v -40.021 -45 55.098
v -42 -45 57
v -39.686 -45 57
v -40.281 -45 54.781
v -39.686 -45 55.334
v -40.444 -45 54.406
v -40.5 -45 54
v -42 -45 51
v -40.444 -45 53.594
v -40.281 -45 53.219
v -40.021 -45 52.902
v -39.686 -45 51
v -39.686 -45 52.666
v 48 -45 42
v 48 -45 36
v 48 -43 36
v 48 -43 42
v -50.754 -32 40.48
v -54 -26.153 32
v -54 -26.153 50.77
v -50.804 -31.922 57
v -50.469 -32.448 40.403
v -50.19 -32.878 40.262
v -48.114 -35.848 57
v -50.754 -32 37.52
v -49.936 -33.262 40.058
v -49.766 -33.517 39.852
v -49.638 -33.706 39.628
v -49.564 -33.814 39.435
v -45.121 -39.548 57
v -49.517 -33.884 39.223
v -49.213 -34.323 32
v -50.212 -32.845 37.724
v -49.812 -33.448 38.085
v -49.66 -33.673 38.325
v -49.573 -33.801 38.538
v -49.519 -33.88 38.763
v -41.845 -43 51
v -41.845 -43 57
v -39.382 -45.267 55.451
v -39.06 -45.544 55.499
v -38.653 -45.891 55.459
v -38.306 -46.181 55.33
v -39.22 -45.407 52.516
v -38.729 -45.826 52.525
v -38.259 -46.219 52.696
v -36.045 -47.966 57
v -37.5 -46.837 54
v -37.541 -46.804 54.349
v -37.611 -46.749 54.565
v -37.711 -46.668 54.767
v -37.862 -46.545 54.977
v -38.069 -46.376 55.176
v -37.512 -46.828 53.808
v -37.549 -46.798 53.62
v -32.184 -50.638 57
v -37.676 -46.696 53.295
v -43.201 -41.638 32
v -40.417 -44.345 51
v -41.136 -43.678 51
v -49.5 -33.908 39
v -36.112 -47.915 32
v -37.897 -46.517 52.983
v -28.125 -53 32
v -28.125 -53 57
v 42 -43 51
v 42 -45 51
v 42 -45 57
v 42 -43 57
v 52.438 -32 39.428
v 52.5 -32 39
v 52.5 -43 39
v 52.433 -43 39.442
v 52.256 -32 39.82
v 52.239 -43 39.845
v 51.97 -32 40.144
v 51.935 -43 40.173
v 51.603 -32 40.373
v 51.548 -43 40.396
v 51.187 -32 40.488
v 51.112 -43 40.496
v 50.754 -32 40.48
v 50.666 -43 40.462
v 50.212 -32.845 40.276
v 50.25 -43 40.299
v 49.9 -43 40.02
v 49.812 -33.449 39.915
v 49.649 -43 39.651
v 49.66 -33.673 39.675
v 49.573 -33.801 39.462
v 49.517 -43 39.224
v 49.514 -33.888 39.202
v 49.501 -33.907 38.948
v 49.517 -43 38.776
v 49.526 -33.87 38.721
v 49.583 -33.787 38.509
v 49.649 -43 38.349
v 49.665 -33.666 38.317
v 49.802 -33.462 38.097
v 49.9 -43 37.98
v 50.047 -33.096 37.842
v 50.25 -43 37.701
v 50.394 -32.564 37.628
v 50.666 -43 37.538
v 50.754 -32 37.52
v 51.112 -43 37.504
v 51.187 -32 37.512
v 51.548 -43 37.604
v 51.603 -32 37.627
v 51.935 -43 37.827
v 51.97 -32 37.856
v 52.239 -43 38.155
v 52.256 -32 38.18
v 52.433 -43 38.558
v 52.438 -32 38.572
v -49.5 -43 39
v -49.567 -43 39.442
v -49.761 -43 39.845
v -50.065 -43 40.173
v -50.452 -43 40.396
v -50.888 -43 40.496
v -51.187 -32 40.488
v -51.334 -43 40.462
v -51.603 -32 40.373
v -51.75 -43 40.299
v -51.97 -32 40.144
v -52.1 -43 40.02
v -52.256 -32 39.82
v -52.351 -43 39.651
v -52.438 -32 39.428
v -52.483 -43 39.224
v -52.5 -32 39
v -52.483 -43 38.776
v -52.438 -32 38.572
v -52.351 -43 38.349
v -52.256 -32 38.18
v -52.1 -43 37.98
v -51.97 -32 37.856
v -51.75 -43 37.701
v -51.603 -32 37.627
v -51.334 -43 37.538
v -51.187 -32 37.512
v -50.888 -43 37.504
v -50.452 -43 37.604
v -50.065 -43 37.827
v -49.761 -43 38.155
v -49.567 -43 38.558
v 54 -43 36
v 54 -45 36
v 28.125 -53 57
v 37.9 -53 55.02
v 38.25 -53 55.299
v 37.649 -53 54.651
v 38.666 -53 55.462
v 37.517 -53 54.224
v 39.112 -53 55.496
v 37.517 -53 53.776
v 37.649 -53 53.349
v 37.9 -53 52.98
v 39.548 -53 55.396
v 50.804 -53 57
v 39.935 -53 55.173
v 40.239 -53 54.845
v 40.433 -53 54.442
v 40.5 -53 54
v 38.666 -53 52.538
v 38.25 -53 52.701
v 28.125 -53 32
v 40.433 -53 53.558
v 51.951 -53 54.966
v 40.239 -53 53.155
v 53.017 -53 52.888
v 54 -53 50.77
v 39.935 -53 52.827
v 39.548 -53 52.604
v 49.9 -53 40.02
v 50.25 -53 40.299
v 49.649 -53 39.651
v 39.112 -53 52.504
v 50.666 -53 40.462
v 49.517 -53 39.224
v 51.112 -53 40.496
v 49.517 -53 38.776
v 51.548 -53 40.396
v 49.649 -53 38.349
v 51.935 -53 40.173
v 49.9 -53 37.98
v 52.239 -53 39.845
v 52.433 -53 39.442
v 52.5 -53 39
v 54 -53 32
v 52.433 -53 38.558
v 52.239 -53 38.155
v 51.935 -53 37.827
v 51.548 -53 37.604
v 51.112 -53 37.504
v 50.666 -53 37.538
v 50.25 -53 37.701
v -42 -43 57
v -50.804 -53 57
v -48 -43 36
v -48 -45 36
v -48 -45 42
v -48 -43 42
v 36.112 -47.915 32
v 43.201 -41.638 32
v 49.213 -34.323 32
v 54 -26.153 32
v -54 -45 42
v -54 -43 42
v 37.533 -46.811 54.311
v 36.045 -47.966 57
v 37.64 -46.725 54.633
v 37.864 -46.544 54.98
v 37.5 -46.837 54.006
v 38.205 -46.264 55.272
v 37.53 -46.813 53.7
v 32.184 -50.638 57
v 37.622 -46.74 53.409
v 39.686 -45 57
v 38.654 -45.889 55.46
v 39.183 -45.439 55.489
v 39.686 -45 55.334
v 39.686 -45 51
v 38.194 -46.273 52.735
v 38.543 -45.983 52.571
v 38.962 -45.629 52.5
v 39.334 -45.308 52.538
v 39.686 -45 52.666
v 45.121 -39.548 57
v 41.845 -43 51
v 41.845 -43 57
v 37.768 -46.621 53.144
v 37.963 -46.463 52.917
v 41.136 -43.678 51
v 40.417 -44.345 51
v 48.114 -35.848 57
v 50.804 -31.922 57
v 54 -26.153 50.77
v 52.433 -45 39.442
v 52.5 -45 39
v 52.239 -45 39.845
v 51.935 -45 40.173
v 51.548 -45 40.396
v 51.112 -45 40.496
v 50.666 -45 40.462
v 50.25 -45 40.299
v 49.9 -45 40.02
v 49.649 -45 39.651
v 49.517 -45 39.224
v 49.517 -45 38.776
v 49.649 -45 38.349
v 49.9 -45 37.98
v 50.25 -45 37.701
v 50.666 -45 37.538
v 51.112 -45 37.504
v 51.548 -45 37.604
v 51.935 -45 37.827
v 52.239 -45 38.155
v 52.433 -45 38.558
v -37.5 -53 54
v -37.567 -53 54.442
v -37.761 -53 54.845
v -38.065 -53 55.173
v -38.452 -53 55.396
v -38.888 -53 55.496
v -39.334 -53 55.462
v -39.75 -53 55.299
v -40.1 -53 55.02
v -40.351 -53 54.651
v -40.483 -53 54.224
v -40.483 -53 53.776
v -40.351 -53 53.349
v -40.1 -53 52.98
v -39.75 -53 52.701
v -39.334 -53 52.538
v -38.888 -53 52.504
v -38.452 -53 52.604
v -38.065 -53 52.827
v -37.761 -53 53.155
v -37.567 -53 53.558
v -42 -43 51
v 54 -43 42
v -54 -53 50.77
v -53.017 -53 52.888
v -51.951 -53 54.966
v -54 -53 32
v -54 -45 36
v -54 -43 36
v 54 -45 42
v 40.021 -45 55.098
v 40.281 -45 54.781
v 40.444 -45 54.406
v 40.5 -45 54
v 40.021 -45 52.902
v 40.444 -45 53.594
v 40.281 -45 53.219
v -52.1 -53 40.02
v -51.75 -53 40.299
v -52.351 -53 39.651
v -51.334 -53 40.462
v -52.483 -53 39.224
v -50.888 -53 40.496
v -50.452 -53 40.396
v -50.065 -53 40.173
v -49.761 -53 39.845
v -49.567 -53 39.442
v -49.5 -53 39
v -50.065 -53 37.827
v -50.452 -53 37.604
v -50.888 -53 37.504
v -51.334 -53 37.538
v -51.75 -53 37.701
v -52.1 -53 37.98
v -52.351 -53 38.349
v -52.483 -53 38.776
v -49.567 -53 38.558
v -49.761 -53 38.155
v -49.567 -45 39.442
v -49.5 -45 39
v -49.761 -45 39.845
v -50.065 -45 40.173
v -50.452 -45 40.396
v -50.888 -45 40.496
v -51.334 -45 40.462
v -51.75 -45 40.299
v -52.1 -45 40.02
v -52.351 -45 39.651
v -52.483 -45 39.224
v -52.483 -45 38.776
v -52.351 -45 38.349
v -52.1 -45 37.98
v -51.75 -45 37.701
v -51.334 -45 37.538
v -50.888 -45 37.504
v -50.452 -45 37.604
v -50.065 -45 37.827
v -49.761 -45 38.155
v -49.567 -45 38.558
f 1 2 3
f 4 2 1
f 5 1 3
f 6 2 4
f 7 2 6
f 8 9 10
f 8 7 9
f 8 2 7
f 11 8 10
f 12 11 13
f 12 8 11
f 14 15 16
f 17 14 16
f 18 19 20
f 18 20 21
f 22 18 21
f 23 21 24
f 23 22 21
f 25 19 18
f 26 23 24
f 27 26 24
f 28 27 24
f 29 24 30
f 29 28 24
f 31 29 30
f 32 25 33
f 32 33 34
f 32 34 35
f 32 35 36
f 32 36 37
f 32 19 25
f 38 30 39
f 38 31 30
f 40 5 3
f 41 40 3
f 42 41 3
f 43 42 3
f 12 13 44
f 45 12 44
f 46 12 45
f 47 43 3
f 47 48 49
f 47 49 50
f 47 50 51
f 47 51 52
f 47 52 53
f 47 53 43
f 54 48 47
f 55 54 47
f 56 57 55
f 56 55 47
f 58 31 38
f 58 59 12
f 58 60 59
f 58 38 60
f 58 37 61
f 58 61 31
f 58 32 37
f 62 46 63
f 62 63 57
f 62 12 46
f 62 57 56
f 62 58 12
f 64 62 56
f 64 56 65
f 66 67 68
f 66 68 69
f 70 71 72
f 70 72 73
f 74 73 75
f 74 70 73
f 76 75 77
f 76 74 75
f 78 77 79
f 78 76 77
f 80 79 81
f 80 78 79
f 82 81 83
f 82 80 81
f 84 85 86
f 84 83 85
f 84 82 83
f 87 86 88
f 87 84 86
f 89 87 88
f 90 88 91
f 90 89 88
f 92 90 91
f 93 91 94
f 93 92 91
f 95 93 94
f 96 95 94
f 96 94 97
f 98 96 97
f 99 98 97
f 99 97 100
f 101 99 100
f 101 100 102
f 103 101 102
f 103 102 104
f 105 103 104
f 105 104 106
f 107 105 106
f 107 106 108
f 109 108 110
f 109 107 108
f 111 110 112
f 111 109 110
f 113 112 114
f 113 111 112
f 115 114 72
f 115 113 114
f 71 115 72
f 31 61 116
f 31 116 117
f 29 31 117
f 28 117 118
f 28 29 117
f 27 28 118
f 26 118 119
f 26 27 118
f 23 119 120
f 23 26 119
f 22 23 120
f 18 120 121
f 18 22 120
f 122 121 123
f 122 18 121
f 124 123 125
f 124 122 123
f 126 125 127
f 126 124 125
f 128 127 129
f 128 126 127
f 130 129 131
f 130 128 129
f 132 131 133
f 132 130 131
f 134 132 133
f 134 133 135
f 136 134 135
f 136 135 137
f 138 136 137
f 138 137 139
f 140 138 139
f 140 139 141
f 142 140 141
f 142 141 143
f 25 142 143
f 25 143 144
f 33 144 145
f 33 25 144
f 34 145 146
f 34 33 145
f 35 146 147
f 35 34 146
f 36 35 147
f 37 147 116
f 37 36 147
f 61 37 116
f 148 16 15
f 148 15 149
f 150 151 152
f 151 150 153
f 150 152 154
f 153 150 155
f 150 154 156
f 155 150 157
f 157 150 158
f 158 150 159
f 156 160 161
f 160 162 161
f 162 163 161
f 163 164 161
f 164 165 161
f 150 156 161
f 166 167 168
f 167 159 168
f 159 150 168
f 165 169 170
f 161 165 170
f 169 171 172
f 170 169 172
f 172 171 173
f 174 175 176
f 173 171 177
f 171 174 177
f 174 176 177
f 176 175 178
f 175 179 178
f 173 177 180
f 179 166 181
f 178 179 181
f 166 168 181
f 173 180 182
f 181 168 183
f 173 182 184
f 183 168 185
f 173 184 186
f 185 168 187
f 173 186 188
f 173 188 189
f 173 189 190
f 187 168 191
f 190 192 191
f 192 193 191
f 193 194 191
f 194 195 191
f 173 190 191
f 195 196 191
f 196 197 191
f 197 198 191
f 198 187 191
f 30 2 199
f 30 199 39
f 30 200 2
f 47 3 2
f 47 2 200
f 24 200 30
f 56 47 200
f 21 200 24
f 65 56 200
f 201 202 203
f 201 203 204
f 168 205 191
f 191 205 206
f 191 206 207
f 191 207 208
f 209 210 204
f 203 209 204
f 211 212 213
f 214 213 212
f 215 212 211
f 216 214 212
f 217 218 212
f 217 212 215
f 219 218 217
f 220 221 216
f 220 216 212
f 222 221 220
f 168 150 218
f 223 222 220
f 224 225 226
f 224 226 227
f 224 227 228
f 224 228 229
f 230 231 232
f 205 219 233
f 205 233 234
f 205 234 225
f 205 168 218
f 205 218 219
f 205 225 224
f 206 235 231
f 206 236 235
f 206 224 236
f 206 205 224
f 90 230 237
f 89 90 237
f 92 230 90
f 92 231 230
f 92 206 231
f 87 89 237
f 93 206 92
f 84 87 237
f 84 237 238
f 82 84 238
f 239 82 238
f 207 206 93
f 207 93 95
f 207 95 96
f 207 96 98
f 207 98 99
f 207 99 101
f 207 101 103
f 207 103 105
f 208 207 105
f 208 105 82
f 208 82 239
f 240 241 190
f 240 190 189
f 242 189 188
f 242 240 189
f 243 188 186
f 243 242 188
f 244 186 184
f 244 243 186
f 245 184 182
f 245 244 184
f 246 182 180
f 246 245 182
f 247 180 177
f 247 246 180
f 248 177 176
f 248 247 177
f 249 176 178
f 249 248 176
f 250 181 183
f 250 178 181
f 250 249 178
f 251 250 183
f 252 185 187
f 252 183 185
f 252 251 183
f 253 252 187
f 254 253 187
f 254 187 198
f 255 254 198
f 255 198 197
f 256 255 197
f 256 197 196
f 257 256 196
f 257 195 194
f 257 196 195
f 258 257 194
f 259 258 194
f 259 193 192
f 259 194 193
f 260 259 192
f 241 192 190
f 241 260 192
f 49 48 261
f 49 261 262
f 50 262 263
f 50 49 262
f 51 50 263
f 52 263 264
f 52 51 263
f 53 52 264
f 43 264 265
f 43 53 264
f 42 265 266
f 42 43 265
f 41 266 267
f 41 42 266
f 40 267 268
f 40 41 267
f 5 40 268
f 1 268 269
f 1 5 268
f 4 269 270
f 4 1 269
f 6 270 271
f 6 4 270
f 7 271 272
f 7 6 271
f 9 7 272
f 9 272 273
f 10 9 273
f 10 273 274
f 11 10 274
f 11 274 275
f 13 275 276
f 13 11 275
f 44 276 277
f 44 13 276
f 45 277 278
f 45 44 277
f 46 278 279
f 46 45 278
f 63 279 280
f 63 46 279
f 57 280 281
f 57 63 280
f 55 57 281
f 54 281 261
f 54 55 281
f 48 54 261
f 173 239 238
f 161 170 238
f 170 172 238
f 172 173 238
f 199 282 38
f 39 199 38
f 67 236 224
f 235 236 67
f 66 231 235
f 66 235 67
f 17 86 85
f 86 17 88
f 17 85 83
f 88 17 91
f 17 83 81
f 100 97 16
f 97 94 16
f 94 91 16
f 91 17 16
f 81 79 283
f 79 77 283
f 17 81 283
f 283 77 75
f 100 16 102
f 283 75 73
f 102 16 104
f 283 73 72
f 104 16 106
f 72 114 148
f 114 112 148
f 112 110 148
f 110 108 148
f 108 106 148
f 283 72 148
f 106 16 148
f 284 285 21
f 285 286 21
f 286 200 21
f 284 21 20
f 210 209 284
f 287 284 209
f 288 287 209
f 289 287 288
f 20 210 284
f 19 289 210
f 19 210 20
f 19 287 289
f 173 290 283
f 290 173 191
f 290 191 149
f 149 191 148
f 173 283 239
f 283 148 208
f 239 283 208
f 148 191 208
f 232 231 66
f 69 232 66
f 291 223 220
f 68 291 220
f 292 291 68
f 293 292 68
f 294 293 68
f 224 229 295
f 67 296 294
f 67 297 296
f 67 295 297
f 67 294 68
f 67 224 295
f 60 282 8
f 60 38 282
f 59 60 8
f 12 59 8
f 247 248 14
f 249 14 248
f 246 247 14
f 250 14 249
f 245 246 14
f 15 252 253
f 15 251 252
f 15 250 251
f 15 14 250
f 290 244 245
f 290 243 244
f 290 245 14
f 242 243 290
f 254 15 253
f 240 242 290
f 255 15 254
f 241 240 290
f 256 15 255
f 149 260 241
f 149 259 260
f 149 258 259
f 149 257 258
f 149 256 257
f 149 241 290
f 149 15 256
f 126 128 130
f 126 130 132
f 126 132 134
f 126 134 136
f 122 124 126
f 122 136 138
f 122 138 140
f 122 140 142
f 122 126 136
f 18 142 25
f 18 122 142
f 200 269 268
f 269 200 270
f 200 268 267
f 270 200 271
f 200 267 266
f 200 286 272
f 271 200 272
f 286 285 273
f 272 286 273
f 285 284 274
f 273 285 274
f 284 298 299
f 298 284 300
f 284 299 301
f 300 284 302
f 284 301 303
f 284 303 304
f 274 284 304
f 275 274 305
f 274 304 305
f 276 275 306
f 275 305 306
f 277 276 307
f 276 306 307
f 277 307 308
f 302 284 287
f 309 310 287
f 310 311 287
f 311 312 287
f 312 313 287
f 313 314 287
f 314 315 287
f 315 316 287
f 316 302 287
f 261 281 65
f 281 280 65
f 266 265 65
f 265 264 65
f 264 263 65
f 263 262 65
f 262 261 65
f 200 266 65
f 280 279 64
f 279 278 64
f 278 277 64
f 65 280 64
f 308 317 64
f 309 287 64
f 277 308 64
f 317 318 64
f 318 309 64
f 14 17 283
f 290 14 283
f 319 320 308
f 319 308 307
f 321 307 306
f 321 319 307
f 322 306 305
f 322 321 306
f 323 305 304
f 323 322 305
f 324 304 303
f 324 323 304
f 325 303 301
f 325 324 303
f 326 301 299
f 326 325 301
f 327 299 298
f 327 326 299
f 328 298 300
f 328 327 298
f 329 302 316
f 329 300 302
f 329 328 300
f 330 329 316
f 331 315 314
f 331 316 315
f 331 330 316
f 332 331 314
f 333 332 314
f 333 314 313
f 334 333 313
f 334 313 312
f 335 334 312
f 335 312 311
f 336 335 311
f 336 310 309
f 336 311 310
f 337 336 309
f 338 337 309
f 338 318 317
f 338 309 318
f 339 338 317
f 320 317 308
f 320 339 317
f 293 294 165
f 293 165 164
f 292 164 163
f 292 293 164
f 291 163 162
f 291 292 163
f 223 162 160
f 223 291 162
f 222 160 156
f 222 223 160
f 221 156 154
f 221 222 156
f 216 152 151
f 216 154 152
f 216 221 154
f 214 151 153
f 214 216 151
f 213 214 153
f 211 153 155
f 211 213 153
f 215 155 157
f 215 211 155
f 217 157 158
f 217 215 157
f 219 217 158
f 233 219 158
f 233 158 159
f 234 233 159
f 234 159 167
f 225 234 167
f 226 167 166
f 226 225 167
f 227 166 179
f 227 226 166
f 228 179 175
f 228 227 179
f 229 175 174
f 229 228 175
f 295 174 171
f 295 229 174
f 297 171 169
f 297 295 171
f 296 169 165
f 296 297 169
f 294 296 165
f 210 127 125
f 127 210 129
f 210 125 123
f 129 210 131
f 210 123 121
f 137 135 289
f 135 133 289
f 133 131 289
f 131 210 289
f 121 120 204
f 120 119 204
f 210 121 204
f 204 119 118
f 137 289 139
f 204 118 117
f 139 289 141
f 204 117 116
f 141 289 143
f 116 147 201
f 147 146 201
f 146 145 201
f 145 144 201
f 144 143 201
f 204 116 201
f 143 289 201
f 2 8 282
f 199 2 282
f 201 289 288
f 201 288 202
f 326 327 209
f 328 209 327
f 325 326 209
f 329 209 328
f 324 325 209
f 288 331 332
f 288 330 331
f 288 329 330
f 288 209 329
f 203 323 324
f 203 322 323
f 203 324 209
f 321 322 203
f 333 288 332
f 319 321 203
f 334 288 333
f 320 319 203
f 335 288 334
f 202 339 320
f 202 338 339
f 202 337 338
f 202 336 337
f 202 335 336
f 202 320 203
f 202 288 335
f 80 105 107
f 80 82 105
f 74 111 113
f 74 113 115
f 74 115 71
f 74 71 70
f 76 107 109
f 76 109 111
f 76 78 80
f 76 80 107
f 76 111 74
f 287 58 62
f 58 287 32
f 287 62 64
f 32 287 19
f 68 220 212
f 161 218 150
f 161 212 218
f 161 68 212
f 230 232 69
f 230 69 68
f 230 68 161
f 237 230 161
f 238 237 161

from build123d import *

# Parameters (mm, degrees)
CYLINDER1442_R     = 1.5
CYLINDER1442_DEPTH = 40
CYLINDER1441_R     = 1.5
CYLINDER1441_DEPTH = 40
BOX485_W           = 6
BOX485_H           = 2
BOX485_DEPTH       = 6
BOX486_W           = 6
BOX486_H           = 2
BOX486_DEPTH       = 6
CYLINDER1440_R     = 59
CYLINDER1440_DEPTH = 40
BOX475_W           = 6
BOX475_H           = 2
BOX475_DEPTH       = 6
BOX474_W           = 6
BOX474_H           = 2
BOX474_DEPTH       = 6
CYLINDER1428_R     = 1.5
CYLINDER1428_DEPTH = 40
CYLINDER1427_R     = 1.5
CYLINDER1427_DEPTH = 40
CYLINDER1439_R     = 60
CYLINDER1439_DEPTH = 25
BOX484_W           = 108
BOX484_H           = 46
BOX484_DEPTH       = 25


with BuildPart() as v_lec1442:
    # Cylinder1442 → Cylinder1442 (new body)
    with BuildSketch(Plane(origin=(-39, -40, 59), x_dir=(1, 0, 0), z_dir=(0, -1, 0))):
        Circle(CYLINDER1442_R)
    extrude(amount=CYLINDER1442_DEPTH)


with BuildPart() as compound847:
    # Cylinder1441 → Cylinder1441 (new body)
    with BuildSketch(Plane(origin=(39, -40, 59), x_dir=(1, 0, 0), z_dir=(0, -1, 0))):
        Circle(CYLINDER1441_R)
    extrude(amount=CYLINDER1441_DEPTH)

    # Compound847: union Válec1442
    add(v_lec1442.part)


with BuildPart() as compound847_1:
    # Compound847 placement: moved
    add(compound847.part.moved(Location((0, 0, -5))))


with BuildPart() as krychle485:
    # Box485 → Box485 (new body)
    with BuildSketch(Plane(origin=(36, -47, 56), x_dir=(1, 0, 0), z_dir=(0, 0, 1))):
        with Locations((3, 1)):
            Rectangle(BOX485_W, BOX485_H)
    extrude(amount=BOX485_DEPTH)


with BuildPart() as compound850:
    # Box486 → Box486 (new body)
    with BuildSketch(Plane(origin=(-42, -47, 56), x_dir=(1, 0, 0), z_dir=(0, 0, 1))):
        with Locations((3, 1)):
            Rectangle(BOX486_W, BOX486_H)
    extrude(amount=BOX486_DEPTH)

    # Compound850: union Krychle485
    add(krychle485.part)


with BuildPart() as compound850_1:
    # Compound850 placement: moved
    add(compound850.part.moved(Location((0, 2, -5))))


with BuildPart() as v_lec1440:
    # Cylinder1440 → Cylinder1440 (new body)
    with BuildSketch(Plane(origin=(0, -17, 27), x_dir=(1, 0, 0), z_dir=(0, -1, 0))):
        Circle(CYLINDER1440_R)
    extrude(amount=CYLINDER1440_DEPTH)


with BuildPart() as krychle475:
    # Box475 → Box475 (new body)
    with BuildSketch(Plane(origin=(-54, -45, 35), x_dir=(1, 0, 0), z_dir=(0, 0, 1))):
        with Locations((3, 1)):
            Rectangle(BOX475_W, BOX475_H)
    extrude(amount=BOX475_DEPTH)


with BuildPart() as compound853:
    # Box474 → Box474 (new body)
    with BuildSketch(Plane(origin=(48, -45, 35), x_dir=(1, 0, 0), z_dir=(0, 0, 1))):
        with Locations((3, 1)):
            Rectangle(BOX474_W, BOX474_H)
    extrude(amount=BOX474_DEPTH)

    # Compound853: union Krychle475
    add(krychle475.part)


with BuildPart() as compound853_1:
    # Compound853 placement: moved
    add(compound853.part.moved(Location((0, 0, -11))))


with BuildPart() as v_lec1428:
    # Cylinder1428 → Cylinder1428 (new body)
    with BuildSketch(Plane(origin=(51, -40, 38), x_dir=(1, 0, 0), z_dir=(0, -1, 0))):
        Circle(CYLINDER1428_R)
    extrude(amount=CYLINDER1428_DEPTH)


with BuildPart() as compound851:
    # Cylinder1427 → Cylinder1427 (new body)
    with BuildSketch(Plane(origin=(-51, -40, 38), x_dir=(1, 0, 0), z_dir=(0, -1, 0))):
        Circle(CYLINDER1427_R)
    extrude(amount=CYLINDER1427_DEPTH)

    # Compound851: union Válec1428
    add(v_lec1428.part)


with BuildPart() as compound851_1:
    # Compound851 placement: moved
    add(compound851.part.moved(Location((0, 8, -11))))


with BuildPart() as v_lec1439:
    # Cylinder1439 → Cylinder1439 (new body)
    with BuildSketch(Plane.XY.offset(20)):
        Circle(CYLINDER1439_R)
    extrude(amount=CYLINDER1439_DEPTH)


with BuildPart() as cut471:
    # Box484 → Box484 (new body)
    with BuildSketch(Plane(origin=(-54, -53, 20), x_dir=(1, 0, 0), z_dir=(0, 0, 1))):
        with Locations((54, 23)):
            Rectangle(BOX484_W, BOX484_H)
    extrude(amount=BOX484_DEPTH)

    # Cut458: cut Válec1439
    add(v_lec1439.part, mode=Mode.SUBTRACT)

    # Cut468: cut Compound851
    add(compound851_1.part, mode=Mode.SUBTRACT)

    # Cut455: cut Compound853
    add(compound853_1.part, mode=Mode.SUBTRACT)


with BuildPart() as cut471_1:
    # Cut455 placement: moved
    add(cut471.part.moved(Location((0, 0, 12))))

    # Common002: intersect Válec1440
    add(v_lec1440.part, mode=Mode.INTERSECT)

    # Cut470: cut Compound850
    add(compound850_1.part, mode=Mode.SUBTRACT)

    # Cut471: cut Compound847
    add(compound847_1.part, mode=Mode.SUBTRACT)


solid = cut471_1.part
